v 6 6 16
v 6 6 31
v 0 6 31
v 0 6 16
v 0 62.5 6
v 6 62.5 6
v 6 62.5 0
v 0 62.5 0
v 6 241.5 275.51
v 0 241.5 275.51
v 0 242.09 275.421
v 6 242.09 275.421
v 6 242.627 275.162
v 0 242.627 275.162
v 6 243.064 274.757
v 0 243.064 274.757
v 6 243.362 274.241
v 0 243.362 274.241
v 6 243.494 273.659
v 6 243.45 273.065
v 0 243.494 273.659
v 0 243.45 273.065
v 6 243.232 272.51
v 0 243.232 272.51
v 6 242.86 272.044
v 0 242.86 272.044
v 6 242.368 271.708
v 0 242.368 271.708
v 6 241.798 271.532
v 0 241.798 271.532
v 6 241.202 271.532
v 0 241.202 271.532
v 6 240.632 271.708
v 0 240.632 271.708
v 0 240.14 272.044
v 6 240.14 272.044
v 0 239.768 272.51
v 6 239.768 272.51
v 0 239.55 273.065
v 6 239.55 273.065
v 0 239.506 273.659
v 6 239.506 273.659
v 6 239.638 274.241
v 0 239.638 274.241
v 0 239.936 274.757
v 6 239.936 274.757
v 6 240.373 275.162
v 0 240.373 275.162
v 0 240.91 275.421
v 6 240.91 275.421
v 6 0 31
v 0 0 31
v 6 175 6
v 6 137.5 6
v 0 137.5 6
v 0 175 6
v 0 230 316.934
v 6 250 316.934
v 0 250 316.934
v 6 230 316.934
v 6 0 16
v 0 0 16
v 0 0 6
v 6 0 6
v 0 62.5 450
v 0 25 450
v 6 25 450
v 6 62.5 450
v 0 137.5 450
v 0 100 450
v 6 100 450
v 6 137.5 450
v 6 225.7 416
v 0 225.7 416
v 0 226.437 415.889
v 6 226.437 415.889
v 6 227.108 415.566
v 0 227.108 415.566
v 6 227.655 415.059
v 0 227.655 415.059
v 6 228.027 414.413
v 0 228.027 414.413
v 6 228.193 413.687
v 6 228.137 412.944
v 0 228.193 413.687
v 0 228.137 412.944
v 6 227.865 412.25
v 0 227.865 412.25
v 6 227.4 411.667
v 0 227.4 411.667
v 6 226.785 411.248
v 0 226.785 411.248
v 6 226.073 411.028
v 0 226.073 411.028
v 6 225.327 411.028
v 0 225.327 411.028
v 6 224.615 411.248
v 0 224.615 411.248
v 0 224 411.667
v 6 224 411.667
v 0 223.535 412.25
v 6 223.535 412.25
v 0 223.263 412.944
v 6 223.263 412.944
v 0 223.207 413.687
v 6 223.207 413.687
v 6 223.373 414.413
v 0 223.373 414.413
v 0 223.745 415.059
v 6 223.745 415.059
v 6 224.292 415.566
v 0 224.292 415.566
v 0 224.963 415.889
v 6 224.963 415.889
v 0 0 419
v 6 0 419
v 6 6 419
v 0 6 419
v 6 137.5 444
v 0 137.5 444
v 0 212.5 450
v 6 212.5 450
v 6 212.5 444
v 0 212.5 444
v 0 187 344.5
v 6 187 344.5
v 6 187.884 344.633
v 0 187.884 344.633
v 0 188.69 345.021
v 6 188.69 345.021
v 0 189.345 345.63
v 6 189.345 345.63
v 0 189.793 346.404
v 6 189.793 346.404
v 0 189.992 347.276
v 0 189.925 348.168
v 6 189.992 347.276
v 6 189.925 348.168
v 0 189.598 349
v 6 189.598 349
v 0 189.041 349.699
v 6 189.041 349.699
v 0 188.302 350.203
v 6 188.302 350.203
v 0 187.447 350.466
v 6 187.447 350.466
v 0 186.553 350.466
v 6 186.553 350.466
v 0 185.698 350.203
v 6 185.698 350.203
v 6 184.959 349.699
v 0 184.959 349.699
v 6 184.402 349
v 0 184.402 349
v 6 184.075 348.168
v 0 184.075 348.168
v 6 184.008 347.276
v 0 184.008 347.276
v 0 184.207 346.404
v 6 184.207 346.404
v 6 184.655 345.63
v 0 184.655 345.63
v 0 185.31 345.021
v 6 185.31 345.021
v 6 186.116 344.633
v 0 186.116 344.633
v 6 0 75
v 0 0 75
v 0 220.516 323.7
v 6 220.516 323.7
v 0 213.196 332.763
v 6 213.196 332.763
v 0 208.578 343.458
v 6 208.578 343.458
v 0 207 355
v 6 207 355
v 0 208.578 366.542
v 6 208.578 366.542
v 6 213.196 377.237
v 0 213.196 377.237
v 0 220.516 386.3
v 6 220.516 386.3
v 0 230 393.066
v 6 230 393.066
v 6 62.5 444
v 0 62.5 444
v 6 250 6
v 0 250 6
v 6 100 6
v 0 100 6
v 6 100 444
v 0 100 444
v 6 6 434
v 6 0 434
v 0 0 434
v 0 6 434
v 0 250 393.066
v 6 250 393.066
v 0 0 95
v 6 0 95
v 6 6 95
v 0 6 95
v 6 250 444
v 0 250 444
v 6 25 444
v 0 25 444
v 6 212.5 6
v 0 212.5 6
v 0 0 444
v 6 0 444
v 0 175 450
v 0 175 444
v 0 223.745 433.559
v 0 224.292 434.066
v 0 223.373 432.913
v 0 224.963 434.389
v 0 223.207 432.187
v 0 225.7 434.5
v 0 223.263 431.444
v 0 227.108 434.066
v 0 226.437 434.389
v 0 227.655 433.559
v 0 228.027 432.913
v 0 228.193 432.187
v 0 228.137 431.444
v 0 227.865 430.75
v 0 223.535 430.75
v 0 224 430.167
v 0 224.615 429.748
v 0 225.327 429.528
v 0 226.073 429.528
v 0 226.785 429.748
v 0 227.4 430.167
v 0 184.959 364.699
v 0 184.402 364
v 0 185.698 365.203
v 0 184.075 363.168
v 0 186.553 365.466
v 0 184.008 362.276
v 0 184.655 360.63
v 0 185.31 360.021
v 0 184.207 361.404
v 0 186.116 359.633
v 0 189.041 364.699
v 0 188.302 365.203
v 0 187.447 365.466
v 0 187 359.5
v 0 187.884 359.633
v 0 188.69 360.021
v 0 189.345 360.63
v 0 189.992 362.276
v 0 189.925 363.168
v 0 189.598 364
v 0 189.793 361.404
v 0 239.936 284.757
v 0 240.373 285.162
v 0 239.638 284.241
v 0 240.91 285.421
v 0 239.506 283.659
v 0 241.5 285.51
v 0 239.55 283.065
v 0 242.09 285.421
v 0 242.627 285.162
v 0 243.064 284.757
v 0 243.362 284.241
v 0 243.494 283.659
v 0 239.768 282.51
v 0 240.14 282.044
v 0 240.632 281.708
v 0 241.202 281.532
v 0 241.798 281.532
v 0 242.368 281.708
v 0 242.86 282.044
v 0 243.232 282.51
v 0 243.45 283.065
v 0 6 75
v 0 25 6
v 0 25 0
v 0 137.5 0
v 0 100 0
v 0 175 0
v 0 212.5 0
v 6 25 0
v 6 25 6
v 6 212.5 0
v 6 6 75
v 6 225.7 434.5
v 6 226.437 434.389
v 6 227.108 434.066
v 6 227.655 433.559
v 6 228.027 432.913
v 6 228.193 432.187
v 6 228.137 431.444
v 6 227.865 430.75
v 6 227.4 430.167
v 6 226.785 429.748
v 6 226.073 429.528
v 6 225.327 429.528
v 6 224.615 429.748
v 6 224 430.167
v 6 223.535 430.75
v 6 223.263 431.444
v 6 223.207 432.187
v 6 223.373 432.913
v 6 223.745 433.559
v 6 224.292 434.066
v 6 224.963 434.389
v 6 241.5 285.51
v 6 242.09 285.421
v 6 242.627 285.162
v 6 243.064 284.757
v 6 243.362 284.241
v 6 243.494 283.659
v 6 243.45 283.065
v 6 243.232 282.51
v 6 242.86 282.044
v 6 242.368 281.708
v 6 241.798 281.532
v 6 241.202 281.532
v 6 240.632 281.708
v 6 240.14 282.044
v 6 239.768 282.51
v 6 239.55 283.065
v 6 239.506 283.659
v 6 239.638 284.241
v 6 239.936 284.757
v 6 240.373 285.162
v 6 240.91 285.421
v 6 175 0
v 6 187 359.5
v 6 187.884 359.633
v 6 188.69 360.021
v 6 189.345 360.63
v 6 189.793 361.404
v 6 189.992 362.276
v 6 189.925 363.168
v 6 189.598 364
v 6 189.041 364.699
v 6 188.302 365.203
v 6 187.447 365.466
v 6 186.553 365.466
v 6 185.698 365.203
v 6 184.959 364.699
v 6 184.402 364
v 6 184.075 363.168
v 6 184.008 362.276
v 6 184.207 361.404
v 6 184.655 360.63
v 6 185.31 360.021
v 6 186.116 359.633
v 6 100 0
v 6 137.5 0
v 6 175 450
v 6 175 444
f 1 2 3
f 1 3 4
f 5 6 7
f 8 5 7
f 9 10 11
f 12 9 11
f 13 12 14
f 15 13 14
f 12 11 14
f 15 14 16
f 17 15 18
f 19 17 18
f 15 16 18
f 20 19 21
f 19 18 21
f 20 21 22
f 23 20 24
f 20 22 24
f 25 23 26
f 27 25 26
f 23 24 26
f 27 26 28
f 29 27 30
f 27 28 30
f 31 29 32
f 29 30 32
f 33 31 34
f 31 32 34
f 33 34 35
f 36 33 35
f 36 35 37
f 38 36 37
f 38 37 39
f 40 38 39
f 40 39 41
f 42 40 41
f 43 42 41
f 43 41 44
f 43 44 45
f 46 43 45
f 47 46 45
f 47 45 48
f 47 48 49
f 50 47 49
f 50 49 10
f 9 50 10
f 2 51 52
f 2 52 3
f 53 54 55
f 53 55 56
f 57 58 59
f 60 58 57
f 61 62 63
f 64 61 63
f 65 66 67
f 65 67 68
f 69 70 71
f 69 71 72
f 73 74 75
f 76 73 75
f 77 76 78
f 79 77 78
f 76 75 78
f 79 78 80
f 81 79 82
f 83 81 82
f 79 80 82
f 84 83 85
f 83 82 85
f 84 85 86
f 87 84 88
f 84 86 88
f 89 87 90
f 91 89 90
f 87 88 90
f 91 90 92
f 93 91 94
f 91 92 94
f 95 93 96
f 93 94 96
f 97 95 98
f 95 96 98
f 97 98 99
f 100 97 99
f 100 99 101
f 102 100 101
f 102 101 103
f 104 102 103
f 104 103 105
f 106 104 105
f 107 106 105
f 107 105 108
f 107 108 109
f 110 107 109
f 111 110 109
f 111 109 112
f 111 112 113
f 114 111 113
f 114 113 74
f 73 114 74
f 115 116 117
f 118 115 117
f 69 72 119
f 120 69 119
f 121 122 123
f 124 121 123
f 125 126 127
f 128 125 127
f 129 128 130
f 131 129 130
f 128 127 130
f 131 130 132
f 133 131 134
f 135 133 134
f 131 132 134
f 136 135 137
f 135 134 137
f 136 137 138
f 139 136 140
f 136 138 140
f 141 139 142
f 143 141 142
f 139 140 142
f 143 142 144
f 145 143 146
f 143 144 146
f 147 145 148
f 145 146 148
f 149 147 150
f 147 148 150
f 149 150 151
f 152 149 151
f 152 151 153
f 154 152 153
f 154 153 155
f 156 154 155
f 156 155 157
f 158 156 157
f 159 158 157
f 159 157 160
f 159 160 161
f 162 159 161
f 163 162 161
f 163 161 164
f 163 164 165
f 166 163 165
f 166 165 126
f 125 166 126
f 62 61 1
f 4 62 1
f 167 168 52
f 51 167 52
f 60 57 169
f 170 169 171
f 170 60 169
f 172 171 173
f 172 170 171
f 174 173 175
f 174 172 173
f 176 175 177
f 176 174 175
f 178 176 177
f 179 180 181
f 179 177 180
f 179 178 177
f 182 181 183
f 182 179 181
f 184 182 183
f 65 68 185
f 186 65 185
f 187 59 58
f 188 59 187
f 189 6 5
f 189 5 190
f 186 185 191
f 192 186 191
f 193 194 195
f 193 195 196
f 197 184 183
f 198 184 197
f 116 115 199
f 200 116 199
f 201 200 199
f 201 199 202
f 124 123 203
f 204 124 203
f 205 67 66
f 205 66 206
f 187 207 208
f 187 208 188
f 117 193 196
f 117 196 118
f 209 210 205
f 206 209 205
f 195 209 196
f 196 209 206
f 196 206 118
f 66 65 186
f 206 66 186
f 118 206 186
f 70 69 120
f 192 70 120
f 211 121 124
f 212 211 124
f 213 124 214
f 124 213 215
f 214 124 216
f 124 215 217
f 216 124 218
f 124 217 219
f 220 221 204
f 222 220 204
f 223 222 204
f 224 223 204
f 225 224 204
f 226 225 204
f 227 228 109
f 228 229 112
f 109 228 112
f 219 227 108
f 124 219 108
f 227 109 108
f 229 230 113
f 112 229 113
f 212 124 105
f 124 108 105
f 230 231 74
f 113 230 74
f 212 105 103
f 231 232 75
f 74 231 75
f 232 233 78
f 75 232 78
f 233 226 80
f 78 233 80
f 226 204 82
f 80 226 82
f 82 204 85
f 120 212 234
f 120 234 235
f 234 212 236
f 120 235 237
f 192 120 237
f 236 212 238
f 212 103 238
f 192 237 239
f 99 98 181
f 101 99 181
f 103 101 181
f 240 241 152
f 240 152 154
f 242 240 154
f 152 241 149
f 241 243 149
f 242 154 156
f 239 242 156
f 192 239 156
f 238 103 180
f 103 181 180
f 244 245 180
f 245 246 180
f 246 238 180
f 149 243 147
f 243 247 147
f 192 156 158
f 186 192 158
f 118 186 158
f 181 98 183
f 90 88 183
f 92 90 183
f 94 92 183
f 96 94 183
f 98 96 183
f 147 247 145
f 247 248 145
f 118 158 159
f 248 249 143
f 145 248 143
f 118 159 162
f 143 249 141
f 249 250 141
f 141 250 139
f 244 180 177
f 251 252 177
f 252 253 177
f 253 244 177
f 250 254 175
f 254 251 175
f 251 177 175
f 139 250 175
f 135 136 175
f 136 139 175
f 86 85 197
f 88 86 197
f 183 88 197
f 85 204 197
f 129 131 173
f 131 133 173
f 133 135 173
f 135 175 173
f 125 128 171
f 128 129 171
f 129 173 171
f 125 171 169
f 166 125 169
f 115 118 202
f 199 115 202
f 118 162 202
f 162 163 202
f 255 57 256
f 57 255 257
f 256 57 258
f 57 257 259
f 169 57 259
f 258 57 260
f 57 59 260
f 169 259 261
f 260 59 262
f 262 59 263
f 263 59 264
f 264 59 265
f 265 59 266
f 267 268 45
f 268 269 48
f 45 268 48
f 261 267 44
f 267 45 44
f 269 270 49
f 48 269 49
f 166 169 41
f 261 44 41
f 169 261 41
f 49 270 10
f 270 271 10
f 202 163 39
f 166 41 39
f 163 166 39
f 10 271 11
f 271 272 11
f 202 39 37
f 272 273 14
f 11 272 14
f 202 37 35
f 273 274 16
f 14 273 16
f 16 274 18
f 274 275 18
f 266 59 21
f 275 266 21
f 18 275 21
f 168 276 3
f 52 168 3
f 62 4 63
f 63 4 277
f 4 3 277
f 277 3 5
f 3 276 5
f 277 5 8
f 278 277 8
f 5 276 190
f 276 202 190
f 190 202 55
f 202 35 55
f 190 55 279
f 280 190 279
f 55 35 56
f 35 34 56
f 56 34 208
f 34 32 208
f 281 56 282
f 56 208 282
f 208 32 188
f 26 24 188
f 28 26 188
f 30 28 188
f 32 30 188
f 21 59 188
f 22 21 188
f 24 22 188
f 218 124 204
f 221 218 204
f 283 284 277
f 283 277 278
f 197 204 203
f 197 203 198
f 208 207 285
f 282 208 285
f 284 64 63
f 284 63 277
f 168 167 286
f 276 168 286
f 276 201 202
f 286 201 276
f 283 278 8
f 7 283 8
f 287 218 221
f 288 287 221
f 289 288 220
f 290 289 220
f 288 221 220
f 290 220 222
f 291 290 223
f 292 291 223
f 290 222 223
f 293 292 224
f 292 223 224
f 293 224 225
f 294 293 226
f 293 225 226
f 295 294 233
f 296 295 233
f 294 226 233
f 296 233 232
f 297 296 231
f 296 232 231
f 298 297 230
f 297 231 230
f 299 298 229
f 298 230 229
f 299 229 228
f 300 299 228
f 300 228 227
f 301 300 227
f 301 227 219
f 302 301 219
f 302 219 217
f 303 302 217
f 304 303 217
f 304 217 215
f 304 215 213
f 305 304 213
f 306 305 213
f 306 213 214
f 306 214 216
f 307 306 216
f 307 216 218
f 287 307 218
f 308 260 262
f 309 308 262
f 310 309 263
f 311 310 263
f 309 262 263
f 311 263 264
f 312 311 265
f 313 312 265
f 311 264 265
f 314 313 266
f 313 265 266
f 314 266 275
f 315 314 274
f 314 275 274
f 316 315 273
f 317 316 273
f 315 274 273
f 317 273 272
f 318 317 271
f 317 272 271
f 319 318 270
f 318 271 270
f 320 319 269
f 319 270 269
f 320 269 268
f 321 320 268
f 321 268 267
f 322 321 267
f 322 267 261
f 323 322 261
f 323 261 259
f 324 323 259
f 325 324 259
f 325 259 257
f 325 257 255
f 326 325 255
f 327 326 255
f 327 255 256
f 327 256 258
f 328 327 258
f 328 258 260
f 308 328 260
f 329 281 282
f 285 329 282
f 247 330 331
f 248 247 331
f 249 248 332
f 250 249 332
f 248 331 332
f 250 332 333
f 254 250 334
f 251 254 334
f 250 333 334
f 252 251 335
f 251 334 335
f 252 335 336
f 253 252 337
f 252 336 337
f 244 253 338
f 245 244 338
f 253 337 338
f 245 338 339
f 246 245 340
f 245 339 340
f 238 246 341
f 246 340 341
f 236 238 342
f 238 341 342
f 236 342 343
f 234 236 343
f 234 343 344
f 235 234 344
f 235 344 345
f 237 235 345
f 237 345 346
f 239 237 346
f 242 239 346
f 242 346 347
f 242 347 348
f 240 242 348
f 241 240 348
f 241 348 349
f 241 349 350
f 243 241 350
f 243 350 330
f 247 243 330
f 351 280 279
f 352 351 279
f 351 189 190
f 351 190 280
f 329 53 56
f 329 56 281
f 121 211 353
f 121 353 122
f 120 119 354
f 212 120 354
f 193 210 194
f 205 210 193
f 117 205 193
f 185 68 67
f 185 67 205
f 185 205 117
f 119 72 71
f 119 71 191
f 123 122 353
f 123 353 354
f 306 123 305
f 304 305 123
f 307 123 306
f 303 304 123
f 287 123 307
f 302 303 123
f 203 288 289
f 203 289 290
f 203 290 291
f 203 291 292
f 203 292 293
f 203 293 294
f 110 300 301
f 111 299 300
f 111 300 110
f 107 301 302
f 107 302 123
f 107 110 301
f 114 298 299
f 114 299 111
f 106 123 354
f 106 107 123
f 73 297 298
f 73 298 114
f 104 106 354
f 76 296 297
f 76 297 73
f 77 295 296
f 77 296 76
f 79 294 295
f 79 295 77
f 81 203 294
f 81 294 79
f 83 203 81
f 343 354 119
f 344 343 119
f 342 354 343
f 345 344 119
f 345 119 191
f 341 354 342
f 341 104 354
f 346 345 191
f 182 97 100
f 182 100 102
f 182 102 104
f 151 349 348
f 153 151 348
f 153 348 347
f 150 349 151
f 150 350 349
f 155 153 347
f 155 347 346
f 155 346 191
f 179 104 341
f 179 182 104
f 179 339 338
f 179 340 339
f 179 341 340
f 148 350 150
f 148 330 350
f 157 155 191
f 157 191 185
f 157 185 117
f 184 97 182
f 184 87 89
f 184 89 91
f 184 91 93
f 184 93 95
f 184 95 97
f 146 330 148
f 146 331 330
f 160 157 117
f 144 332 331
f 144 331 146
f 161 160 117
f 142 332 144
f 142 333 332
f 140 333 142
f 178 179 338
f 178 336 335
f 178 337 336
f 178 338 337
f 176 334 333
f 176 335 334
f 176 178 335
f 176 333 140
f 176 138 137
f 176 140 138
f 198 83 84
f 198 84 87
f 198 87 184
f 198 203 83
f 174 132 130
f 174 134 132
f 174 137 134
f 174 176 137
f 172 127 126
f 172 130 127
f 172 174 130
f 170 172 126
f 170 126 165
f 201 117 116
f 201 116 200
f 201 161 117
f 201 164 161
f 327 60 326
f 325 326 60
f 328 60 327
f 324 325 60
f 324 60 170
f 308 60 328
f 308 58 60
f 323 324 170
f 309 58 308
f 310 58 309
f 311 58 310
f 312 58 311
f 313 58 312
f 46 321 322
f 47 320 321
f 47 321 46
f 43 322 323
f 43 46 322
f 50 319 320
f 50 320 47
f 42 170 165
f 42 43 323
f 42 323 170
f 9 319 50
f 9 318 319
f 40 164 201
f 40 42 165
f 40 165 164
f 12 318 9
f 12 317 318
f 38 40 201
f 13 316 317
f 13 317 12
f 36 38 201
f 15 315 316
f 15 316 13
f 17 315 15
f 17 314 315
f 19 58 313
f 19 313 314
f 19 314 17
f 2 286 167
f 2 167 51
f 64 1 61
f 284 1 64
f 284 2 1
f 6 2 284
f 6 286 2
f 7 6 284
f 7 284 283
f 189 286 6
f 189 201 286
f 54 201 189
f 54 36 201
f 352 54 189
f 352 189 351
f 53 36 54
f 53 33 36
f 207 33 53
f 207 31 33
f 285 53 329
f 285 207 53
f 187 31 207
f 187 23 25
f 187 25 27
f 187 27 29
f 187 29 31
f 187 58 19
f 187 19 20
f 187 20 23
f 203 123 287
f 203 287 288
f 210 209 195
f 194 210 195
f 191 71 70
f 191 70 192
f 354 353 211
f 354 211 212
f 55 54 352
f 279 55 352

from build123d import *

# Parameters (mm, degrees)
SKETCH1_W            = 450
SKETCH1_H            = 250
BOSS_EXTRUDE1_DEPTH  = 6
SKETCH2_W            = 6
SKETCH2_H            = 37.5
CUT_EXTRUDE1_DEPTH   = 515.816472153
LPATTERN1_COUNT      = 4
LPATTERN1_PITCH      = 75
LPATTERN1_COUNT_DIR2 = 2
LPATTERN1_PITCH_DIR2 = 444
SKETCH3_W            = 15
SKETCH3_H            = 6
CUT_EXTRUDE2_DEPTH   = 515.816472153
LPATTERN2_COUNT      = 2
LPATTERN2_PITCH      = 403
SKETCH4_R            = 3
CUT_EXTRUDE3_DEPTH   = 10
SKETCH5_W            = 20
SKETCH5_H            = 6
CUT_EXTRUDE4_DEPTH   = 515.816472153
SKETCH6_R            = 2.5
SKETCH6_R_2          = 2
CUT_EXTRUDE5_DEPTH   = 515.816472153


with BuildPart() as part:
    # Sketch1 → Boss-Extrude1 (new body)
    with BuildSketch(Plane(origin=(0, 0, 0), x_dir=(0, 0, -1), z_dir=(1, 0, 0))):
        with Locations((-225, 125)):
            Rectangle(SKETCH1_W, SKETCH1_H)
    extrude(amount=BOSS_EXTRUDE1_DEPTH)

    # Sketch2 → Cut-Extrude1 (cut, through all)
    with BuildSketch(Plane(origin=(6, 0, 0), x_dir=(0, 0, -1), z_dir=(1, 0, 0))):
        with Locations((-447, 231.25)):
            Rectangle(SKETCH2_W, SKETCH2_H)
    cut_extrude1 = extrude(amount=-CUT_EXTRUDE1_DEPTH, mode=Mode.SUBTRACT)

    # LPattern1: Cut-Extrude1 4 × 2
    with Locations(*[(0, -i * LPATTERN1_PITCH, -j * LPATTERN1_PITCH_DIR2) for i in range(LPATTERN1_COUNT) for j in range(LPATTERN1_COUNT_DIR2) if (i, j) != (0, 0)]):
        add(cut_extrude1, mode=Mode.SUBTRACT)

    # Sketch3 → Cut-Extrude2 (cut, through all)
    with BuildSketch(Plane(origin=(6, 0, 0), x_dir=(0, 0, -1), z_dir=(1, 0, 0))):
        with Locations((-426.5, 3)):
            Rectangle(SKETCH3_W, SKETCH3_H)
    cut_extrude2 = extrude(amount=-CUT_EXTRUDE2_DEPTH, mode=Mode.SUBTRACT)

    # LPattern2: Cut-Extrude2 ×2
    with Locations(*[(0, 0, -i * LPATTERN2_PITCH) for i in range(1, LPATTERN2_COUNT)]):
        add(cut_extrude2, mode=Mode.SUBTRACT)

    # Sketch4 → Cut-Extrude3 (cut)
    with BuildSketch(Plane(origin=(6, 0, 0), x_dir=(0, 0, -1), z_dir=(1, 0, 0))):
        with Locations((-362.5, 187)):
            Circle(SKETCH4_R)
        with Locations((-347.5, 187)):
            Circle(SKETCH4_R)
        with BuildLine():
            Line((-393.065732621, 230), (-393.065732621, 250))
            Line((-393.065732621, 250), (-316.934267379, 250))
            Line((-316.934267379, 250), (-316.934267379, 230))
            ThreePointArc((-316.934267379, 230), (-355, 207), (-393.065732621, 230))
        make_face()
    extrude(amount=-CUT_EXTRUDE3_DEPTH, mode=Mode.SUBTRACT)

    # Sketch5 → Cut-Extrude4 (cut, through all)
    with BuildSketch(Plane(origin=(6, 0, 0), x_dir=(0, 0, -1), z_dir=(1, 0, 0))):
        with Locations((-85, 3)):
            Rectangle(SKETCH5_W, SKETCH5_H)
    extrude(amount=-CUT_EXTRUDE4_DEPTH, mode=Mode.SUBTRACT)

    # Sketch6 → Cut-Extrude5 (cut, through all)
    with BuildSketch(Plane.ZY):
        with Locations((432, 225.7)):
            Circle(SKETCH6_R)
        with Locations((413.5, 225.7)):
            Circle(SKETCH6_R)
        with Locations((283.51, 241.5)):
            Circle(SKETCH6_R_2)
        with Locations((273.51, 241.5)):
            Circle(SKETCH6_R_2)
    extrude(amount=-CUT_EXTRUDE5_DEPTH, mode=Mode.SUBTRACT)


solid = part.part
